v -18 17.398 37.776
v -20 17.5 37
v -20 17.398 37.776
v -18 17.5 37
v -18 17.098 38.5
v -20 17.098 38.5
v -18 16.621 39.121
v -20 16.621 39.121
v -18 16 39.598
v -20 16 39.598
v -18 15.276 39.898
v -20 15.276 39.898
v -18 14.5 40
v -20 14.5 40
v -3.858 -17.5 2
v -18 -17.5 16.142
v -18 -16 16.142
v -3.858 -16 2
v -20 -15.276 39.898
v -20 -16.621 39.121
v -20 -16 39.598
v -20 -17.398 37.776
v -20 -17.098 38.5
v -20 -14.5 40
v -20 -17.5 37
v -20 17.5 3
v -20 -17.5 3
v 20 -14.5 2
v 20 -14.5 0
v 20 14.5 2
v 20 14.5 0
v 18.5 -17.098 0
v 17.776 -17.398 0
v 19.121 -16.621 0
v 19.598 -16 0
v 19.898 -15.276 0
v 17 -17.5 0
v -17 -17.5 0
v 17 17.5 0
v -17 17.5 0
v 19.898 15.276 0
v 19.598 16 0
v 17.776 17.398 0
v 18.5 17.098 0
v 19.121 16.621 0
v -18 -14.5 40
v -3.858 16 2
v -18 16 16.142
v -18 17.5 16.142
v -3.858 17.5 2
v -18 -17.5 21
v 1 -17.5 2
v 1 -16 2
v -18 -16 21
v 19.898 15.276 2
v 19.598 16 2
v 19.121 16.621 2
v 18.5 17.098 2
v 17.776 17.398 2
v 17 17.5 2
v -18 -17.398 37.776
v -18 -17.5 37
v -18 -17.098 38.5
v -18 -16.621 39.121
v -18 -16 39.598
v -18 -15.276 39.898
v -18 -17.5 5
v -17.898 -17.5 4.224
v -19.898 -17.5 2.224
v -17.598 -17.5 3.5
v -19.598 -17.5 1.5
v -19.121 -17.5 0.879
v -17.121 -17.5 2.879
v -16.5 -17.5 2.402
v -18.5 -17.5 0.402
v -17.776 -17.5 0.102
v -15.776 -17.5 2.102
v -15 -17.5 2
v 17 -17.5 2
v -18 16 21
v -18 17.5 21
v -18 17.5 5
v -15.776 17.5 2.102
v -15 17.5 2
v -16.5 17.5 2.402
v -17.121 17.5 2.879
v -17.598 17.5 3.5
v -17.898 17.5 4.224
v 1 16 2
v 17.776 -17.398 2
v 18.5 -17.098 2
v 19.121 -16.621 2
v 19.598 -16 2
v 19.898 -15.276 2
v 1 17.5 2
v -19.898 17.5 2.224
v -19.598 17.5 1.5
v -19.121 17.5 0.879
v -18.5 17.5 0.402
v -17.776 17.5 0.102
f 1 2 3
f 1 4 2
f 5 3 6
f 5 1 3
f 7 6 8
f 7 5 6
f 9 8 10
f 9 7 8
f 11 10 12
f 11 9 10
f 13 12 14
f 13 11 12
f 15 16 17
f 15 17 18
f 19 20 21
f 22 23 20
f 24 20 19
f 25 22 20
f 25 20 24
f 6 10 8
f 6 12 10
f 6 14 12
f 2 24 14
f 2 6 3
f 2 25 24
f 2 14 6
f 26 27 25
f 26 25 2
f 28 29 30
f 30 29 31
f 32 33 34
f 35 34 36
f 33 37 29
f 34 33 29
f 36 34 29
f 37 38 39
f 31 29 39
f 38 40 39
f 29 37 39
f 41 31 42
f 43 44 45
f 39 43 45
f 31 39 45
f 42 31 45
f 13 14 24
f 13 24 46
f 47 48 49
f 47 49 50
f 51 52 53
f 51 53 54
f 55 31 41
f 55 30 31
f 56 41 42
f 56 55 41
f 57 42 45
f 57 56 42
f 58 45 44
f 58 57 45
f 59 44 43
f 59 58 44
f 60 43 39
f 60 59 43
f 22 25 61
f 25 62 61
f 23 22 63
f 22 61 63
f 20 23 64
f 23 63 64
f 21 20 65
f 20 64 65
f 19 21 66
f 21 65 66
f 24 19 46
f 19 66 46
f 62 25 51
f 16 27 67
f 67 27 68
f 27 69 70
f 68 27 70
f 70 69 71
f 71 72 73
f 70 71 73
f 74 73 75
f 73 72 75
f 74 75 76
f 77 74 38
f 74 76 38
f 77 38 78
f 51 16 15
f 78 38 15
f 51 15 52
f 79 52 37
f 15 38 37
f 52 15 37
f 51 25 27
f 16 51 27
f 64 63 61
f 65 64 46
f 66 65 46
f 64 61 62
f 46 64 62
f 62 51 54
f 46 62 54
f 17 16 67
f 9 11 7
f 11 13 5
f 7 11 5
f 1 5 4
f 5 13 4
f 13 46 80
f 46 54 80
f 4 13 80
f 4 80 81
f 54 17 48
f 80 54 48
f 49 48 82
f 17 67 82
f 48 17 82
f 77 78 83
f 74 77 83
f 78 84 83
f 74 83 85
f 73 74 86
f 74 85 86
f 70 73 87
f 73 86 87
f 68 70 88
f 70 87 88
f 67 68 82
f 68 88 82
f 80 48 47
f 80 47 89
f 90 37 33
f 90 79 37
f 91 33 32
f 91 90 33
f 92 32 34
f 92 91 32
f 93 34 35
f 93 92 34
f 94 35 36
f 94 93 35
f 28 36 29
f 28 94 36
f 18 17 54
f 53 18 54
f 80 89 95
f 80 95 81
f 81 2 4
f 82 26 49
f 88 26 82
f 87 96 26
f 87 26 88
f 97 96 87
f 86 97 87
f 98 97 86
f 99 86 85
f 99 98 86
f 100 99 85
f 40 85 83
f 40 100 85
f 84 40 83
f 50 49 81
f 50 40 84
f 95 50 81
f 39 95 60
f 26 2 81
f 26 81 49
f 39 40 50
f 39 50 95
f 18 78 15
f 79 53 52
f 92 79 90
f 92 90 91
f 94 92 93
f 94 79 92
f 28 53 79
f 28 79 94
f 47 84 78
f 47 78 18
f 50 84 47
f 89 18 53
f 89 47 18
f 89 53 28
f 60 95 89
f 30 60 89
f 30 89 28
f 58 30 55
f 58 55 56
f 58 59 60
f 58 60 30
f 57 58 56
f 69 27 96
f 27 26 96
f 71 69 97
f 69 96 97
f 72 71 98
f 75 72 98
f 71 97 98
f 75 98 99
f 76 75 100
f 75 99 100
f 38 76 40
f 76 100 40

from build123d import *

# Parameters (mm, degrees)
SKETCH1_W           = 40
SKETCH1_H           = 35
BOSS_EXTRUDE1_DEPTH = 2
SKETCH2_W           = 2
SKETCH2_H           = 35
BOSS_EXTRUDE2_DEPTH = 38
FILLET1_R           = 3
BOSS_EXTRUDE3_DEPTH = 1.5
BOSS_EXTRUDE4_START = -33.5
BOSS_EXTRUDE4_DEPTH = 1.5


with BuildPart() as part:
    # Sketch1 → Boss-Extrude1 (new body)
    with BuildSketch(Plane.XY):
        Rectangle(SKETCH1_W, SKETCH1_H)
    extrude(amount=BOSS_EXTRUDE1_DEPTH)

    # Sketch2 → Boss-Extrude2 (add)
    with BuildSketch(Plane.XY.offset(2)):
        with Locations((-19, 0)):
            Rectangle(SKETCH2_W, SKETCH2_H)
    extrude(amount=BOSS_EXTRUDE2_DEPTH)

    # Fillet1
    fillet1_edges = [part.edges().sort_by_distance(p)[0] for p in [
        (-18, 0, 2),
        (-19, 17.5, 40),
        (-19, -17.5, 40),
        (-20, 0, 0),
        (20, -17.5, 1),
        (20, 17.5, 1),
    ]]
    fillet(fillet1_edges, radius=FILLET1_R)

    # Sketch3 → Boss-Extrude3 (add)
    with BuildSketch(Plane.XZ.offset(17.5)):
        Polygon((1, 2), (-18, 21), (-18, 16.142135624), (-3.857864376, 2), align=None)
    extrude(amount=-BOSS_EXTRUDE3_DEPTH)

    # Sketch3<2> → Boss-Extrude4 (add)
    with BuildSketch(Plane.XZ.offset(17.5).offset(BOSS_EXTRUDE4_START)):
        Polygon((1, 2), (-18, 21), (-18, 16.142135624), (-3.857864376, 2), align=None)
    extrude(amount=-BOSS_EXTRUDE4_DEPTH)


solid = part.part
